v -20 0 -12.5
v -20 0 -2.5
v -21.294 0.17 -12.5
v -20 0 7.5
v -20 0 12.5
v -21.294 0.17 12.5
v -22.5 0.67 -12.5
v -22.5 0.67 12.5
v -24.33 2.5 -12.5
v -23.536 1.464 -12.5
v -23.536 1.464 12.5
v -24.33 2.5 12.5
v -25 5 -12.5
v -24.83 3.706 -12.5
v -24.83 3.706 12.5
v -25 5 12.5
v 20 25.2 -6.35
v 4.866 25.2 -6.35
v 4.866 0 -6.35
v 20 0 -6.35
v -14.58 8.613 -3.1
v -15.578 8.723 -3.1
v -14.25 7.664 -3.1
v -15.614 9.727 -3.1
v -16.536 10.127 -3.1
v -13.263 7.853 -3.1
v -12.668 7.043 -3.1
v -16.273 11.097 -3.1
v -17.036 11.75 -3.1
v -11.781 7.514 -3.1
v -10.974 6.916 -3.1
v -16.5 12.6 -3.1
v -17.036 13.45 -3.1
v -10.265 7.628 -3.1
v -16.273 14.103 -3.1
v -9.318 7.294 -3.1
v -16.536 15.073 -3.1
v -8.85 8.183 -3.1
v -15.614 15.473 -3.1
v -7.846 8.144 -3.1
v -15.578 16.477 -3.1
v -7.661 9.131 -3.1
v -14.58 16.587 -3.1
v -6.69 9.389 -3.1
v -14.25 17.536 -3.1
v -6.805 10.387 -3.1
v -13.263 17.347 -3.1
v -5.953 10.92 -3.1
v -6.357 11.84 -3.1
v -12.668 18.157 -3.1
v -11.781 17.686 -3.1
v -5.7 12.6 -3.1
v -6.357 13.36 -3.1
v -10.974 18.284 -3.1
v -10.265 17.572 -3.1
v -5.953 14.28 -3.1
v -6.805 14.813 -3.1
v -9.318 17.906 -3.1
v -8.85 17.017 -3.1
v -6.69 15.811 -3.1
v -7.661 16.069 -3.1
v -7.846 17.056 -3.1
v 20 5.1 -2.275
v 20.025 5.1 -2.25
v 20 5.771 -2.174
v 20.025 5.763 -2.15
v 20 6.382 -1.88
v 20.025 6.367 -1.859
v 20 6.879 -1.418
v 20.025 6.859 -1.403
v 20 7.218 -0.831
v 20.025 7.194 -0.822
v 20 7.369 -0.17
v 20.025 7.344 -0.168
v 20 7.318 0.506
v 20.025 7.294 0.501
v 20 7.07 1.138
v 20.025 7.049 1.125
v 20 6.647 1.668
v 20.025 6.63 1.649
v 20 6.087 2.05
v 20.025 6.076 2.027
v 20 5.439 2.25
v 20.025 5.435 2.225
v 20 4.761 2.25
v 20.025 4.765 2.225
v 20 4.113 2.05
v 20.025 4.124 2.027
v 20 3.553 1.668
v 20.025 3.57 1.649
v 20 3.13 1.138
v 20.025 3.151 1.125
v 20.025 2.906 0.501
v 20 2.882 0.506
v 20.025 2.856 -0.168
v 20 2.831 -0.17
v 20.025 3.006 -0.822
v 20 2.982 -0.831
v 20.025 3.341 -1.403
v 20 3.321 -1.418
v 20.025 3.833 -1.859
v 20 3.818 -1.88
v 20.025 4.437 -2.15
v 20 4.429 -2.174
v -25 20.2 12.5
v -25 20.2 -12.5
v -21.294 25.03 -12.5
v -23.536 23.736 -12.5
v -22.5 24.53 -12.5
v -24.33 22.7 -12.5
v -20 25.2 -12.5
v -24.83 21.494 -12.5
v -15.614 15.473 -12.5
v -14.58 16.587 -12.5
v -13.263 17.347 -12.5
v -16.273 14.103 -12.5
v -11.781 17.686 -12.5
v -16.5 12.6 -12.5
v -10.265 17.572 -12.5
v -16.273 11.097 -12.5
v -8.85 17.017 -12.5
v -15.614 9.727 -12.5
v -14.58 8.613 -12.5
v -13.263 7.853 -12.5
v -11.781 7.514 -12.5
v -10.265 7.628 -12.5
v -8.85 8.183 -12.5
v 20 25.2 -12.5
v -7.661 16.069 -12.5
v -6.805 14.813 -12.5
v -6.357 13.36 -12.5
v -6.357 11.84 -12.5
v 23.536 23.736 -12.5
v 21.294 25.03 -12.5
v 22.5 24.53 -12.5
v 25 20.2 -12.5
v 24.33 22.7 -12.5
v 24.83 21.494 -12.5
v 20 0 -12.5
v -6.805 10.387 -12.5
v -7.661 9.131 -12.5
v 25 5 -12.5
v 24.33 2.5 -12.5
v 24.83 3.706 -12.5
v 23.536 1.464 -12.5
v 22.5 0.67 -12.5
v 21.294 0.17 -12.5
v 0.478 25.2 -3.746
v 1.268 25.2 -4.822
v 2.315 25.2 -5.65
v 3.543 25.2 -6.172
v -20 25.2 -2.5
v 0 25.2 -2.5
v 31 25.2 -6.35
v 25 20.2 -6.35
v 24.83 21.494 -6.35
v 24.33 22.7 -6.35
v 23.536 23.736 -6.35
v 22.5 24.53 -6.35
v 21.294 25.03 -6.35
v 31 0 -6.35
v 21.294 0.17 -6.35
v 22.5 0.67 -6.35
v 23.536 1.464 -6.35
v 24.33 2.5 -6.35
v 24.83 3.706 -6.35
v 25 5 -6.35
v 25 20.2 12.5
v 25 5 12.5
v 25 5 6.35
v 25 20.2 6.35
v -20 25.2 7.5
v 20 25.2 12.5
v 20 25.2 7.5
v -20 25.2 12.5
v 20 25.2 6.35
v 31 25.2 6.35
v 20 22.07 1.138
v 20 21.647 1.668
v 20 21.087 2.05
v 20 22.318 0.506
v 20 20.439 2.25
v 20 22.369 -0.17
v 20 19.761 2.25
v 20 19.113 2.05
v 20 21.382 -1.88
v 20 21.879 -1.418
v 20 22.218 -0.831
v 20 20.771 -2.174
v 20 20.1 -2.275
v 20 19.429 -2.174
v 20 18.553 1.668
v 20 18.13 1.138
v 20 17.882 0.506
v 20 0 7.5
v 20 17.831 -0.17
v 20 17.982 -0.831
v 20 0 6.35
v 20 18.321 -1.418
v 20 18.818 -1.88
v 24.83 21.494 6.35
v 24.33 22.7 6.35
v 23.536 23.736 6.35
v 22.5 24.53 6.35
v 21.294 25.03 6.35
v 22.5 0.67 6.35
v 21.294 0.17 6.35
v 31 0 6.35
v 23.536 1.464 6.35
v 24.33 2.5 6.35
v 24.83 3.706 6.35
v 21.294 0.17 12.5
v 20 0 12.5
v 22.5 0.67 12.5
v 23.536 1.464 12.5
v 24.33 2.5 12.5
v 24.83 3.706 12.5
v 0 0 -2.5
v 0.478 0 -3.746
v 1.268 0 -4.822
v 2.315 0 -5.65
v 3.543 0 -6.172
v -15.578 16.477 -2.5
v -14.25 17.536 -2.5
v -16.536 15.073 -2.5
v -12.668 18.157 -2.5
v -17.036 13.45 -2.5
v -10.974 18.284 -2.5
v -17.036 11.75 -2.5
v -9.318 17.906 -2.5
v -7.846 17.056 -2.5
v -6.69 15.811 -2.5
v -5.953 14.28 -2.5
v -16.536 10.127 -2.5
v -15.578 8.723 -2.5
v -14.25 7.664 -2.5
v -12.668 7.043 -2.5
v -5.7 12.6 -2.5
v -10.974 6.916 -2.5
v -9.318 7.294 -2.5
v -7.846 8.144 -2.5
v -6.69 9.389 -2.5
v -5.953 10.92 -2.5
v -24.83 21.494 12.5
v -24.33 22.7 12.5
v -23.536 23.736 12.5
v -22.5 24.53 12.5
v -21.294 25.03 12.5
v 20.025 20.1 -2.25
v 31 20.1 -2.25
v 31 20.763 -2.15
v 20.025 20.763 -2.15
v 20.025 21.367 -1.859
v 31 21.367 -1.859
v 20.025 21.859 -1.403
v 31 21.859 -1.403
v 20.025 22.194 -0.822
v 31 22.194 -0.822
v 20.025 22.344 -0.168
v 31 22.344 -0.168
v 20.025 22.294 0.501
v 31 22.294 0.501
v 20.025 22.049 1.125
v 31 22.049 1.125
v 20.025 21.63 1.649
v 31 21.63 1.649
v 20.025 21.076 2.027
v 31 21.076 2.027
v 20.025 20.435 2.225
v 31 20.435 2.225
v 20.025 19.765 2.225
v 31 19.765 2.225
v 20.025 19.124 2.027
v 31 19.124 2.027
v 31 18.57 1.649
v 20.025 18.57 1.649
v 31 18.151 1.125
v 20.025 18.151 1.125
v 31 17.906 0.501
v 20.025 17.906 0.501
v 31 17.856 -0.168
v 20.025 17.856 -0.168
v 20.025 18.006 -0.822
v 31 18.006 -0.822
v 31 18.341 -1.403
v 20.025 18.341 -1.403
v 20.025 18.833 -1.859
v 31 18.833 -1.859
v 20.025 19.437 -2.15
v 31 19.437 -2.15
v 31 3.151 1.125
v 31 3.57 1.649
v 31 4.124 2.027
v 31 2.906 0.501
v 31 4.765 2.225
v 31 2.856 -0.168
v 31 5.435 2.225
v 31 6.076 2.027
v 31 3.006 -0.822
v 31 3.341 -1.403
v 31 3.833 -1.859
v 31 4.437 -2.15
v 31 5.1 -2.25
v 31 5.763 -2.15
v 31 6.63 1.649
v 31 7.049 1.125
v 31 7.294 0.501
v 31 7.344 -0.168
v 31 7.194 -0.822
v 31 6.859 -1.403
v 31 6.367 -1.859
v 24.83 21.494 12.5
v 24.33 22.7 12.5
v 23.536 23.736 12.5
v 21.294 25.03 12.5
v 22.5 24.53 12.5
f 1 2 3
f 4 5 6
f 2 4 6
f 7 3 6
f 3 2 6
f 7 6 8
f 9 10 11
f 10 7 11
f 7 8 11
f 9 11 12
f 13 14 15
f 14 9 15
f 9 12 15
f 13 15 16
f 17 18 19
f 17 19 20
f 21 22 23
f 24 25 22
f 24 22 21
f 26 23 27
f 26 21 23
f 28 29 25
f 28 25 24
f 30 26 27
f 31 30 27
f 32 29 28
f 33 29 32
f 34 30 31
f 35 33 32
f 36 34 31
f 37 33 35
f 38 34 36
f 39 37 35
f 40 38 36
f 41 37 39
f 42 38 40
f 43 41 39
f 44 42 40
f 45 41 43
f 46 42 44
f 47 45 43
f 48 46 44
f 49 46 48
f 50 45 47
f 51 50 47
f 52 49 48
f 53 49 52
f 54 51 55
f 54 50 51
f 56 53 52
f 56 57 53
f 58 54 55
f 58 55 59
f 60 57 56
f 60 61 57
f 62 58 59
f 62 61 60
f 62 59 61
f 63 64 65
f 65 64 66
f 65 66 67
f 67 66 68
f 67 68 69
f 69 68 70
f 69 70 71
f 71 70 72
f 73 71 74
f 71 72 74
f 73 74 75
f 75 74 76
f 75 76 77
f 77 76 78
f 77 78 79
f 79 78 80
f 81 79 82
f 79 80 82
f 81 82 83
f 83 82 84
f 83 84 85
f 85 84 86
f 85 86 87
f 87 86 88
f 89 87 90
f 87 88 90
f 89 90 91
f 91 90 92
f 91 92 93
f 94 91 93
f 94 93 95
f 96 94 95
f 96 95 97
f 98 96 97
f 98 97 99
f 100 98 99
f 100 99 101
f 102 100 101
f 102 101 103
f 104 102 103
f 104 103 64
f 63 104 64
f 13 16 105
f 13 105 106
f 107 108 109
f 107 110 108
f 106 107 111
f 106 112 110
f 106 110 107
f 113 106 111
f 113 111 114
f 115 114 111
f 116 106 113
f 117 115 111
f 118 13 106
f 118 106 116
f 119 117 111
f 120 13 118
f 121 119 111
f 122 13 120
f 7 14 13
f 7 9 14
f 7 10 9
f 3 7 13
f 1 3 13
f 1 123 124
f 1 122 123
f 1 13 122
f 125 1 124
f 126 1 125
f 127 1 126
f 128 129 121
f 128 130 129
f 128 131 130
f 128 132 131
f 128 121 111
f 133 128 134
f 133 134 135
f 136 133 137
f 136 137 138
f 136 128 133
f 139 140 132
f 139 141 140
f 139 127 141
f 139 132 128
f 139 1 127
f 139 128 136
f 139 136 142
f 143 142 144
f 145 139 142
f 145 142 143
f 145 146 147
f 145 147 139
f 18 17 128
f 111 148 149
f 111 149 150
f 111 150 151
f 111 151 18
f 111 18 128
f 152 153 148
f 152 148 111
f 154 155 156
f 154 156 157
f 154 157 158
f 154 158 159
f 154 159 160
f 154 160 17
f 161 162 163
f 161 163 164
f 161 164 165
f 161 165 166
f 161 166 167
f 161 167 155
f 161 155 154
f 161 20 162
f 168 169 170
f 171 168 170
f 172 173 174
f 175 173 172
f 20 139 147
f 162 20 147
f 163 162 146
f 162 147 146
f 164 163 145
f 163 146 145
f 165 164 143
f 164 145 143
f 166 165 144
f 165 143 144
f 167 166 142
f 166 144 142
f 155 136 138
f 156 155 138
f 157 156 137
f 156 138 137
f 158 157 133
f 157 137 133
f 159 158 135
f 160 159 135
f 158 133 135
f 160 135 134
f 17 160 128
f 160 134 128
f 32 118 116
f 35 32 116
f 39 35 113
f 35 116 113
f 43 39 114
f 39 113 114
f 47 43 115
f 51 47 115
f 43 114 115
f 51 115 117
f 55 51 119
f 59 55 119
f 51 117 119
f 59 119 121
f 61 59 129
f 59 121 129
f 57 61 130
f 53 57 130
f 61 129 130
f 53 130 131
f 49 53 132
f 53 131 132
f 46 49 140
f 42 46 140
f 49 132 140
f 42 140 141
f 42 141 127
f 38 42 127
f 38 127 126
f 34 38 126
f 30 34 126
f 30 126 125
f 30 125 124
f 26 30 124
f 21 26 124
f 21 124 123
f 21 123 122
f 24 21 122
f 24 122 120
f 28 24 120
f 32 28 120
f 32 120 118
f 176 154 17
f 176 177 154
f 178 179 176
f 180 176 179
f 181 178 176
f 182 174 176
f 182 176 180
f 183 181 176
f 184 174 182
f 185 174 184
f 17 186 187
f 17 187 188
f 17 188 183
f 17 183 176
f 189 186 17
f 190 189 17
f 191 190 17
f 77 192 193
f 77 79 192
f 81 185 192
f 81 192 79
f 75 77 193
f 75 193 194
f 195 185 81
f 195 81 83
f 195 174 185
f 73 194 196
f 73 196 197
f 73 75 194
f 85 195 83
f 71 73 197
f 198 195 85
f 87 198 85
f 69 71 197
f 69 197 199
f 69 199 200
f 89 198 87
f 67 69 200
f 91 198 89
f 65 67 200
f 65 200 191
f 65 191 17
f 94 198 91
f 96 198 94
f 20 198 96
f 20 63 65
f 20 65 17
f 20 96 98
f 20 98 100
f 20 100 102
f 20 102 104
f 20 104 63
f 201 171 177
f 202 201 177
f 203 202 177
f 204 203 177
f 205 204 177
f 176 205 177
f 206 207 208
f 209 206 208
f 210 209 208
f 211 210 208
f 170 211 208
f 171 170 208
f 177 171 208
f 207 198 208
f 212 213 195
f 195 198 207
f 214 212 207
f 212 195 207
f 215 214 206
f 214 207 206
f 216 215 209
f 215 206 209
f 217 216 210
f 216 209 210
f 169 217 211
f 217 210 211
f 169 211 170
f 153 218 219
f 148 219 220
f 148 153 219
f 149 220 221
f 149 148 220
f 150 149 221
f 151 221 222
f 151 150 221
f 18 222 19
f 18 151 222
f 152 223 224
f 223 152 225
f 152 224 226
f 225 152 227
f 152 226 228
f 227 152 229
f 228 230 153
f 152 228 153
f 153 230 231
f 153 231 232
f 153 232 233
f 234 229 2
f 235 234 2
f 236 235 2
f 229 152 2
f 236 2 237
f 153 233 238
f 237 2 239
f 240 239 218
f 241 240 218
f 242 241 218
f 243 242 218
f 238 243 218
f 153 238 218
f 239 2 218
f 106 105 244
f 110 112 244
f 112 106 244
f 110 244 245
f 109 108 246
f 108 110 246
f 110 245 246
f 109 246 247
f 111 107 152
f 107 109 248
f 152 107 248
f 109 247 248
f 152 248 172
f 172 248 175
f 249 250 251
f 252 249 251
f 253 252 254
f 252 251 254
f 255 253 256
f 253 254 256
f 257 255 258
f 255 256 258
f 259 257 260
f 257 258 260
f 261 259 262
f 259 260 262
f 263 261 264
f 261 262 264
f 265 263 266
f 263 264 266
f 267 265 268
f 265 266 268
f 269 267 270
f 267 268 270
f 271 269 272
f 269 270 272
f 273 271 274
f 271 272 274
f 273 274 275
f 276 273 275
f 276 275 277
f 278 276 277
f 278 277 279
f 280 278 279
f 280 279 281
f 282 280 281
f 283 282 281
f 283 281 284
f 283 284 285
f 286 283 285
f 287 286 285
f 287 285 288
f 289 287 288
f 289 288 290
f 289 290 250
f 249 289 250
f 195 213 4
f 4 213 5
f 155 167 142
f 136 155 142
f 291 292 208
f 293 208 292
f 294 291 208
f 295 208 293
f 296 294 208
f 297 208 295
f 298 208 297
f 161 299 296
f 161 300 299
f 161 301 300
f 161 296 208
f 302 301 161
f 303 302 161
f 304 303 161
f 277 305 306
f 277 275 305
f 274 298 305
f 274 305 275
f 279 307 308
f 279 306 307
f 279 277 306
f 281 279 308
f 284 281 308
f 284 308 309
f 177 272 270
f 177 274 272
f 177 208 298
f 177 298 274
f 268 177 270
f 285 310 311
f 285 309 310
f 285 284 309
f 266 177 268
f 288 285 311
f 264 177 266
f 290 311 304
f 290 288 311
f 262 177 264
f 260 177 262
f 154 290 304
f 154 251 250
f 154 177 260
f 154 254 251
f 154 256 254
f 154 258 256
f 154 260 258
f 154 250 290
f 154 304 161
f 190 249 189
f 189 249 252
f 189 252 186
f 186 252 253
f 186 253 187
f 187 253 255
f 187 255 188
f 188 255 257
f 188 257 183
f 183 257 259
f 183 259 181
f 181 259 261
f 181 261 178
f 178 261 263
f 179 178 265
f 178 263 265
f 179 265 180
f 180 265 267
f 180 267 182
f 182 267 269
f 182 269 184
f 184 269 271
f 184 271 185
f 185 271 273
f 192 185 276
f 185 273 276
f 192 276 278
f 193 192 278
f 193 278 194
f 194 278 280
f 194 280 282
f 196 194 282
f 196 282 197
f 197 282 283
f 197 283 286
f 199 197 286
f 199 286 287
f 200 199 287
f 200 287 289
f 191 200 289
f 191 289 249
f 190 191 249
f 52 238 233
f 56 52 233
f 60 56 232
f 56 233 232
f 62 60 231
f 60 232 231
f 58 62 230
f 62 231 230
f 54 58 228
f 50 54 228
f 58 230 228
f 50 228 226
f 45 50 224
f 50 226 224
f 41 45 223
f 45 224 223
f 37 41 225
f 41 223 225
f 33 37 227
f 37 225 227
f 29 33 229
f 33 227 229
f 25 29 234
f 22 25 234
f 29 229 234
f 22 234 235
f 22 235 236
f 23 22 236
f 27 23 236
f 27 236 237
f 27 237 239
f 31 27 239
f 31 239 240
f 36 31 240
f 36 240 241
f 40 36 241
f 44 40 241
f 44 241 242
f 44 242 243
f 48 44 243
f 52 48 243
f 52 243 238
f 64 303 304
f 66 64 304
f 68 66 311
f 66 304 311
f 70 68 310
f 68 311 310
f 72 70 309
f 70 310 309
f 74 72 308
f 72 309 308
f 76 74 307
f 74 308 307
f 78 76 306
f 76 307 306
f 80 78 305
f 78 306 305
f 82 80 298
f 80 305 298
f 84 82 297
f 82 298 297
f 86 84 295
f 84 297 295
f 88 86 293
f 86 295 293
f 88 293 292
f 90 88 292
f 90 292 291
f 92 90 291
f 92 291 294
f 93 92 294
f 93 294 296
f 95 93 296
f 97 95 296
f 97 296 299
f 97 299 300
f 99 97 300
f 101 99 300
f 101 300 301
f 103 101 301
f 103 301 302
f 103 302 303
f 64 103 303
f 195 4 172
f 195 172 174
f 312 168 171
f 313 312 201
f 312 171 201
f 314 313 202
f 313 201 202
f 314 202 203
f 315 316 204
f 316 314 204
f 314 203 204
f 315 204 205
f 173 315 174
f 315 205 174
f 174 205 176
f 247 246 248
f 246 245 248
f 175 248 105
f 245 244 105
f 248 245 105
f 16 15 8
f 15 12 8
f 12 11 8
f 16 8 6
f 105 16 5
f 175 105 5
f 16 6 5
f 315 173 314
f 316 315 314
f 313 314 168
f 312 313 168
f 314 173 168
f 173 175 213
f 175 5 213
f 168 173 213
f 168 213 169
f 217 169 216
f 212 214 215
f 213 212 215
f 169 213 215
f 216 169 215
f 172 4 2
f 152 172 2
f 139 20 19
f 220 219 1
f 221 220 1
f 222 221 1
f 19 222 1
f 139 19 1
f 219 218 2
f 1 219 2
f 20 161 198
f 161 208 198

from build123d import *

# Parameters (mm, degrees)
SKETCH1_W                      = 50
SKETCH1_H                      = 25
SKETCH1_W_2                    = 40
SKETCH1_H_2                    = 10
BOSS_EXTRUDE1_DEPTH            = 25.2
HOLE1_D                        = 10.2
HOLE1_DEPTH                    = 10
HOLE1_CBORE_D                  = 11.4
HOLE1_CBORE_DEPTH              = 0.6
SKETCH10_W                     = 12.7
SKETCH10_H                     = 25.2
BOSS_EXTRUDE2_DEPTH            = 6
M4_CLEARANCE_HOLE1_D           = 4.5
M4_CLEARANCE_HOLE1_DEPTH       = 11
M4_CLEARANCE_HOLE1_CSINK_D     = 4.55
M4_CLEARANCE_HOLE1_CSINK_ANGLE = 90
SKETCH11_W                     = 20
SKETCH11_H                     = 3.85
CUT_EXTRUDE1_DEPTH             = 42.860363114
FILLET1_R                      = 5


with BuildPart() as part:
    # Sketch1 → Boss-Extrude1 (new body)
    with BuildSketch(Plane(origin=(0, 0, 0), x_dir=(1, 0, 0), z_dir=(0, 1, 0))):
        Rectangle(SKETCH1_W, SKETCH1_H)
        with Locations((0, -2.5)):
            Rectangle(SKETCH1_W_2, SKETCH1_H_2, mode=Mode.SUBTRACT)
    extrude(amount=BOSS_EXTRUDE1_DEPTH)

    # Hole1
    with Locations(Plane.XY.offset(-2.5)):
        with Locations((-11.4, 12.6)):
            CounterBoreHole(HOLE1_D / 2, HOLE1_CBORE_D / 2, HOLE1_CBORE_DEPTH, depth=HOLE1_DEPTH)

    # Sketch10 → Boss-Extrude2 (add)
    with BuildSketch(Plane(origin=(25, 0, 0), x_dir=(0, 0, -1), z_dir=(1, 0, 0))):
        with Locations((0, 12.6)):
            Rectangle(SKETCH10_W, SKETCH10_H)
    extrude(amount=BOSS_EXTRUDE2_DEPTH)

    # M4 Clearance Hole1
    with Locations(Plane.ZY.offset(-20)):
        with Locations((0, 20.1), (0, 5.1)):
            CounterSinkHole(M4_CLEARANCE_HOLE1_D / 2, M4_CLEARANCE_HOLE1_CSINK_D / 2, depth=M4_CLEARANCE_HOLE1_DEPTH, counter_sink_angle=M4_CLEARANCE_HOLE1_CSINK_ANGLE)

    # Sketch11 → Cut-Extrude1 (cut, through all)
    with BuildSketch(Plane(origin=(0, 25.2, 0), x_dir=(1, 0, 0), z_dir=(0, 1, 0))):
        with Locations((10, 4.425)):
            Rectangle(SKETCH11_W, SKETCH11_H)
    extrude(amount=-CUT_EXTRUDE1_DEPTH, mode=Mode.SUBTRACT)

    # Fillet1
    # the kernel refuses this fillet: 5 mm, written as the material it adds along each edge
    with BuildSketch(Plane(origin=(0, 25.2, -6.35), x_dir=(1, 0, 0), z_dir=(0, -1, 0))) as fillet1_piece_1:
        with BuildLine():
            CenterArc((4.865953144, 5), FILLET1_R, 193.297071747, 76.702928253)
            Line((0, 3.85), (0, 0))
            Line((0, 0), (4.865953144, 0))
        make_face()
    extrude(amount=25.2)
    # the kernel refuses this fillet: 5 mm, written as the material it takes off along each edge
    with BuildSketch(Plane(origin=(25, 0, -25), x_dir=(-1, 0, 0), z_dir=(0, 0, 1)), Plane(origin=(25, 0, 6.35), x_dir=(-1, 0, 0), z_dir=(0, 0, 1))) as fillet1_2_piece_1:
        with BuildLine():
            CenterArc((FILLET1_R, -FILLET1_R), FILLET1_R, 90, 90)
            Line((0, -FILLET1_R), (0, 0))
            Line((0, 0), (FILLET1_R, 0))
        make_face()
    extrude(amount=18.65, mode=Mode.SUBTRACT)
    with BuildSketch(Plane(origin=(25, 25.2, -25), x_dir=(-1, 0, 0), z_dir=(0, 0, 1)), Plane(origin=(25, 25.2, 6.35), x_dir=(-1, 0, 0), z_dir=(0, 0, 1))) as fillet1_2_piece_2:
        with BuildLine():
            CenterArc((FILLET1_R, FILLET1_R), FILLET1_R, 180, 90)
            Line((0, FILLET1_R), (0, 0))
            Line((0, 0), (FILLET1_R, 0))
        make_face()
    extrude(amount=18.65, mode=Mode.SUBTRACT)
    with BuildSketch(Plane(origin=(-25, 0, 25), x_dir=(0, 1, 0), z_dir=(0, 0, -1))) as fillet1_2_piece_3:
        with BuildLine():
            CenterArc((FILLET1_R, FILLET1_R), FILLET1_R, 180, 90)
            Line((0, FILLET1_R), (0, 0))
            Line((0, 0), (FILLET1_R, 0))
        make_face()
    extrude(amount=50, mode=Mode.SUBTRACT)
    with BuildSketch(Plane(origin=(-25, 25.2, 25), x_dir=(0, -1, 0), z_dir=(0, 0, -1))) as fillet1_2_piece_4:
        with BuildLine():
            CenterArc((FILLET1_R, -FILLET1_R), FILLET1_R, 90, 90)
            Line((0, -FILLET1_R), (0, 0))
            Line((0, 0), (FILLET1_R, 0))
        make_face()
    extrude(amount=50, mode=Mode.SUBTRACT)


solid = part.part
